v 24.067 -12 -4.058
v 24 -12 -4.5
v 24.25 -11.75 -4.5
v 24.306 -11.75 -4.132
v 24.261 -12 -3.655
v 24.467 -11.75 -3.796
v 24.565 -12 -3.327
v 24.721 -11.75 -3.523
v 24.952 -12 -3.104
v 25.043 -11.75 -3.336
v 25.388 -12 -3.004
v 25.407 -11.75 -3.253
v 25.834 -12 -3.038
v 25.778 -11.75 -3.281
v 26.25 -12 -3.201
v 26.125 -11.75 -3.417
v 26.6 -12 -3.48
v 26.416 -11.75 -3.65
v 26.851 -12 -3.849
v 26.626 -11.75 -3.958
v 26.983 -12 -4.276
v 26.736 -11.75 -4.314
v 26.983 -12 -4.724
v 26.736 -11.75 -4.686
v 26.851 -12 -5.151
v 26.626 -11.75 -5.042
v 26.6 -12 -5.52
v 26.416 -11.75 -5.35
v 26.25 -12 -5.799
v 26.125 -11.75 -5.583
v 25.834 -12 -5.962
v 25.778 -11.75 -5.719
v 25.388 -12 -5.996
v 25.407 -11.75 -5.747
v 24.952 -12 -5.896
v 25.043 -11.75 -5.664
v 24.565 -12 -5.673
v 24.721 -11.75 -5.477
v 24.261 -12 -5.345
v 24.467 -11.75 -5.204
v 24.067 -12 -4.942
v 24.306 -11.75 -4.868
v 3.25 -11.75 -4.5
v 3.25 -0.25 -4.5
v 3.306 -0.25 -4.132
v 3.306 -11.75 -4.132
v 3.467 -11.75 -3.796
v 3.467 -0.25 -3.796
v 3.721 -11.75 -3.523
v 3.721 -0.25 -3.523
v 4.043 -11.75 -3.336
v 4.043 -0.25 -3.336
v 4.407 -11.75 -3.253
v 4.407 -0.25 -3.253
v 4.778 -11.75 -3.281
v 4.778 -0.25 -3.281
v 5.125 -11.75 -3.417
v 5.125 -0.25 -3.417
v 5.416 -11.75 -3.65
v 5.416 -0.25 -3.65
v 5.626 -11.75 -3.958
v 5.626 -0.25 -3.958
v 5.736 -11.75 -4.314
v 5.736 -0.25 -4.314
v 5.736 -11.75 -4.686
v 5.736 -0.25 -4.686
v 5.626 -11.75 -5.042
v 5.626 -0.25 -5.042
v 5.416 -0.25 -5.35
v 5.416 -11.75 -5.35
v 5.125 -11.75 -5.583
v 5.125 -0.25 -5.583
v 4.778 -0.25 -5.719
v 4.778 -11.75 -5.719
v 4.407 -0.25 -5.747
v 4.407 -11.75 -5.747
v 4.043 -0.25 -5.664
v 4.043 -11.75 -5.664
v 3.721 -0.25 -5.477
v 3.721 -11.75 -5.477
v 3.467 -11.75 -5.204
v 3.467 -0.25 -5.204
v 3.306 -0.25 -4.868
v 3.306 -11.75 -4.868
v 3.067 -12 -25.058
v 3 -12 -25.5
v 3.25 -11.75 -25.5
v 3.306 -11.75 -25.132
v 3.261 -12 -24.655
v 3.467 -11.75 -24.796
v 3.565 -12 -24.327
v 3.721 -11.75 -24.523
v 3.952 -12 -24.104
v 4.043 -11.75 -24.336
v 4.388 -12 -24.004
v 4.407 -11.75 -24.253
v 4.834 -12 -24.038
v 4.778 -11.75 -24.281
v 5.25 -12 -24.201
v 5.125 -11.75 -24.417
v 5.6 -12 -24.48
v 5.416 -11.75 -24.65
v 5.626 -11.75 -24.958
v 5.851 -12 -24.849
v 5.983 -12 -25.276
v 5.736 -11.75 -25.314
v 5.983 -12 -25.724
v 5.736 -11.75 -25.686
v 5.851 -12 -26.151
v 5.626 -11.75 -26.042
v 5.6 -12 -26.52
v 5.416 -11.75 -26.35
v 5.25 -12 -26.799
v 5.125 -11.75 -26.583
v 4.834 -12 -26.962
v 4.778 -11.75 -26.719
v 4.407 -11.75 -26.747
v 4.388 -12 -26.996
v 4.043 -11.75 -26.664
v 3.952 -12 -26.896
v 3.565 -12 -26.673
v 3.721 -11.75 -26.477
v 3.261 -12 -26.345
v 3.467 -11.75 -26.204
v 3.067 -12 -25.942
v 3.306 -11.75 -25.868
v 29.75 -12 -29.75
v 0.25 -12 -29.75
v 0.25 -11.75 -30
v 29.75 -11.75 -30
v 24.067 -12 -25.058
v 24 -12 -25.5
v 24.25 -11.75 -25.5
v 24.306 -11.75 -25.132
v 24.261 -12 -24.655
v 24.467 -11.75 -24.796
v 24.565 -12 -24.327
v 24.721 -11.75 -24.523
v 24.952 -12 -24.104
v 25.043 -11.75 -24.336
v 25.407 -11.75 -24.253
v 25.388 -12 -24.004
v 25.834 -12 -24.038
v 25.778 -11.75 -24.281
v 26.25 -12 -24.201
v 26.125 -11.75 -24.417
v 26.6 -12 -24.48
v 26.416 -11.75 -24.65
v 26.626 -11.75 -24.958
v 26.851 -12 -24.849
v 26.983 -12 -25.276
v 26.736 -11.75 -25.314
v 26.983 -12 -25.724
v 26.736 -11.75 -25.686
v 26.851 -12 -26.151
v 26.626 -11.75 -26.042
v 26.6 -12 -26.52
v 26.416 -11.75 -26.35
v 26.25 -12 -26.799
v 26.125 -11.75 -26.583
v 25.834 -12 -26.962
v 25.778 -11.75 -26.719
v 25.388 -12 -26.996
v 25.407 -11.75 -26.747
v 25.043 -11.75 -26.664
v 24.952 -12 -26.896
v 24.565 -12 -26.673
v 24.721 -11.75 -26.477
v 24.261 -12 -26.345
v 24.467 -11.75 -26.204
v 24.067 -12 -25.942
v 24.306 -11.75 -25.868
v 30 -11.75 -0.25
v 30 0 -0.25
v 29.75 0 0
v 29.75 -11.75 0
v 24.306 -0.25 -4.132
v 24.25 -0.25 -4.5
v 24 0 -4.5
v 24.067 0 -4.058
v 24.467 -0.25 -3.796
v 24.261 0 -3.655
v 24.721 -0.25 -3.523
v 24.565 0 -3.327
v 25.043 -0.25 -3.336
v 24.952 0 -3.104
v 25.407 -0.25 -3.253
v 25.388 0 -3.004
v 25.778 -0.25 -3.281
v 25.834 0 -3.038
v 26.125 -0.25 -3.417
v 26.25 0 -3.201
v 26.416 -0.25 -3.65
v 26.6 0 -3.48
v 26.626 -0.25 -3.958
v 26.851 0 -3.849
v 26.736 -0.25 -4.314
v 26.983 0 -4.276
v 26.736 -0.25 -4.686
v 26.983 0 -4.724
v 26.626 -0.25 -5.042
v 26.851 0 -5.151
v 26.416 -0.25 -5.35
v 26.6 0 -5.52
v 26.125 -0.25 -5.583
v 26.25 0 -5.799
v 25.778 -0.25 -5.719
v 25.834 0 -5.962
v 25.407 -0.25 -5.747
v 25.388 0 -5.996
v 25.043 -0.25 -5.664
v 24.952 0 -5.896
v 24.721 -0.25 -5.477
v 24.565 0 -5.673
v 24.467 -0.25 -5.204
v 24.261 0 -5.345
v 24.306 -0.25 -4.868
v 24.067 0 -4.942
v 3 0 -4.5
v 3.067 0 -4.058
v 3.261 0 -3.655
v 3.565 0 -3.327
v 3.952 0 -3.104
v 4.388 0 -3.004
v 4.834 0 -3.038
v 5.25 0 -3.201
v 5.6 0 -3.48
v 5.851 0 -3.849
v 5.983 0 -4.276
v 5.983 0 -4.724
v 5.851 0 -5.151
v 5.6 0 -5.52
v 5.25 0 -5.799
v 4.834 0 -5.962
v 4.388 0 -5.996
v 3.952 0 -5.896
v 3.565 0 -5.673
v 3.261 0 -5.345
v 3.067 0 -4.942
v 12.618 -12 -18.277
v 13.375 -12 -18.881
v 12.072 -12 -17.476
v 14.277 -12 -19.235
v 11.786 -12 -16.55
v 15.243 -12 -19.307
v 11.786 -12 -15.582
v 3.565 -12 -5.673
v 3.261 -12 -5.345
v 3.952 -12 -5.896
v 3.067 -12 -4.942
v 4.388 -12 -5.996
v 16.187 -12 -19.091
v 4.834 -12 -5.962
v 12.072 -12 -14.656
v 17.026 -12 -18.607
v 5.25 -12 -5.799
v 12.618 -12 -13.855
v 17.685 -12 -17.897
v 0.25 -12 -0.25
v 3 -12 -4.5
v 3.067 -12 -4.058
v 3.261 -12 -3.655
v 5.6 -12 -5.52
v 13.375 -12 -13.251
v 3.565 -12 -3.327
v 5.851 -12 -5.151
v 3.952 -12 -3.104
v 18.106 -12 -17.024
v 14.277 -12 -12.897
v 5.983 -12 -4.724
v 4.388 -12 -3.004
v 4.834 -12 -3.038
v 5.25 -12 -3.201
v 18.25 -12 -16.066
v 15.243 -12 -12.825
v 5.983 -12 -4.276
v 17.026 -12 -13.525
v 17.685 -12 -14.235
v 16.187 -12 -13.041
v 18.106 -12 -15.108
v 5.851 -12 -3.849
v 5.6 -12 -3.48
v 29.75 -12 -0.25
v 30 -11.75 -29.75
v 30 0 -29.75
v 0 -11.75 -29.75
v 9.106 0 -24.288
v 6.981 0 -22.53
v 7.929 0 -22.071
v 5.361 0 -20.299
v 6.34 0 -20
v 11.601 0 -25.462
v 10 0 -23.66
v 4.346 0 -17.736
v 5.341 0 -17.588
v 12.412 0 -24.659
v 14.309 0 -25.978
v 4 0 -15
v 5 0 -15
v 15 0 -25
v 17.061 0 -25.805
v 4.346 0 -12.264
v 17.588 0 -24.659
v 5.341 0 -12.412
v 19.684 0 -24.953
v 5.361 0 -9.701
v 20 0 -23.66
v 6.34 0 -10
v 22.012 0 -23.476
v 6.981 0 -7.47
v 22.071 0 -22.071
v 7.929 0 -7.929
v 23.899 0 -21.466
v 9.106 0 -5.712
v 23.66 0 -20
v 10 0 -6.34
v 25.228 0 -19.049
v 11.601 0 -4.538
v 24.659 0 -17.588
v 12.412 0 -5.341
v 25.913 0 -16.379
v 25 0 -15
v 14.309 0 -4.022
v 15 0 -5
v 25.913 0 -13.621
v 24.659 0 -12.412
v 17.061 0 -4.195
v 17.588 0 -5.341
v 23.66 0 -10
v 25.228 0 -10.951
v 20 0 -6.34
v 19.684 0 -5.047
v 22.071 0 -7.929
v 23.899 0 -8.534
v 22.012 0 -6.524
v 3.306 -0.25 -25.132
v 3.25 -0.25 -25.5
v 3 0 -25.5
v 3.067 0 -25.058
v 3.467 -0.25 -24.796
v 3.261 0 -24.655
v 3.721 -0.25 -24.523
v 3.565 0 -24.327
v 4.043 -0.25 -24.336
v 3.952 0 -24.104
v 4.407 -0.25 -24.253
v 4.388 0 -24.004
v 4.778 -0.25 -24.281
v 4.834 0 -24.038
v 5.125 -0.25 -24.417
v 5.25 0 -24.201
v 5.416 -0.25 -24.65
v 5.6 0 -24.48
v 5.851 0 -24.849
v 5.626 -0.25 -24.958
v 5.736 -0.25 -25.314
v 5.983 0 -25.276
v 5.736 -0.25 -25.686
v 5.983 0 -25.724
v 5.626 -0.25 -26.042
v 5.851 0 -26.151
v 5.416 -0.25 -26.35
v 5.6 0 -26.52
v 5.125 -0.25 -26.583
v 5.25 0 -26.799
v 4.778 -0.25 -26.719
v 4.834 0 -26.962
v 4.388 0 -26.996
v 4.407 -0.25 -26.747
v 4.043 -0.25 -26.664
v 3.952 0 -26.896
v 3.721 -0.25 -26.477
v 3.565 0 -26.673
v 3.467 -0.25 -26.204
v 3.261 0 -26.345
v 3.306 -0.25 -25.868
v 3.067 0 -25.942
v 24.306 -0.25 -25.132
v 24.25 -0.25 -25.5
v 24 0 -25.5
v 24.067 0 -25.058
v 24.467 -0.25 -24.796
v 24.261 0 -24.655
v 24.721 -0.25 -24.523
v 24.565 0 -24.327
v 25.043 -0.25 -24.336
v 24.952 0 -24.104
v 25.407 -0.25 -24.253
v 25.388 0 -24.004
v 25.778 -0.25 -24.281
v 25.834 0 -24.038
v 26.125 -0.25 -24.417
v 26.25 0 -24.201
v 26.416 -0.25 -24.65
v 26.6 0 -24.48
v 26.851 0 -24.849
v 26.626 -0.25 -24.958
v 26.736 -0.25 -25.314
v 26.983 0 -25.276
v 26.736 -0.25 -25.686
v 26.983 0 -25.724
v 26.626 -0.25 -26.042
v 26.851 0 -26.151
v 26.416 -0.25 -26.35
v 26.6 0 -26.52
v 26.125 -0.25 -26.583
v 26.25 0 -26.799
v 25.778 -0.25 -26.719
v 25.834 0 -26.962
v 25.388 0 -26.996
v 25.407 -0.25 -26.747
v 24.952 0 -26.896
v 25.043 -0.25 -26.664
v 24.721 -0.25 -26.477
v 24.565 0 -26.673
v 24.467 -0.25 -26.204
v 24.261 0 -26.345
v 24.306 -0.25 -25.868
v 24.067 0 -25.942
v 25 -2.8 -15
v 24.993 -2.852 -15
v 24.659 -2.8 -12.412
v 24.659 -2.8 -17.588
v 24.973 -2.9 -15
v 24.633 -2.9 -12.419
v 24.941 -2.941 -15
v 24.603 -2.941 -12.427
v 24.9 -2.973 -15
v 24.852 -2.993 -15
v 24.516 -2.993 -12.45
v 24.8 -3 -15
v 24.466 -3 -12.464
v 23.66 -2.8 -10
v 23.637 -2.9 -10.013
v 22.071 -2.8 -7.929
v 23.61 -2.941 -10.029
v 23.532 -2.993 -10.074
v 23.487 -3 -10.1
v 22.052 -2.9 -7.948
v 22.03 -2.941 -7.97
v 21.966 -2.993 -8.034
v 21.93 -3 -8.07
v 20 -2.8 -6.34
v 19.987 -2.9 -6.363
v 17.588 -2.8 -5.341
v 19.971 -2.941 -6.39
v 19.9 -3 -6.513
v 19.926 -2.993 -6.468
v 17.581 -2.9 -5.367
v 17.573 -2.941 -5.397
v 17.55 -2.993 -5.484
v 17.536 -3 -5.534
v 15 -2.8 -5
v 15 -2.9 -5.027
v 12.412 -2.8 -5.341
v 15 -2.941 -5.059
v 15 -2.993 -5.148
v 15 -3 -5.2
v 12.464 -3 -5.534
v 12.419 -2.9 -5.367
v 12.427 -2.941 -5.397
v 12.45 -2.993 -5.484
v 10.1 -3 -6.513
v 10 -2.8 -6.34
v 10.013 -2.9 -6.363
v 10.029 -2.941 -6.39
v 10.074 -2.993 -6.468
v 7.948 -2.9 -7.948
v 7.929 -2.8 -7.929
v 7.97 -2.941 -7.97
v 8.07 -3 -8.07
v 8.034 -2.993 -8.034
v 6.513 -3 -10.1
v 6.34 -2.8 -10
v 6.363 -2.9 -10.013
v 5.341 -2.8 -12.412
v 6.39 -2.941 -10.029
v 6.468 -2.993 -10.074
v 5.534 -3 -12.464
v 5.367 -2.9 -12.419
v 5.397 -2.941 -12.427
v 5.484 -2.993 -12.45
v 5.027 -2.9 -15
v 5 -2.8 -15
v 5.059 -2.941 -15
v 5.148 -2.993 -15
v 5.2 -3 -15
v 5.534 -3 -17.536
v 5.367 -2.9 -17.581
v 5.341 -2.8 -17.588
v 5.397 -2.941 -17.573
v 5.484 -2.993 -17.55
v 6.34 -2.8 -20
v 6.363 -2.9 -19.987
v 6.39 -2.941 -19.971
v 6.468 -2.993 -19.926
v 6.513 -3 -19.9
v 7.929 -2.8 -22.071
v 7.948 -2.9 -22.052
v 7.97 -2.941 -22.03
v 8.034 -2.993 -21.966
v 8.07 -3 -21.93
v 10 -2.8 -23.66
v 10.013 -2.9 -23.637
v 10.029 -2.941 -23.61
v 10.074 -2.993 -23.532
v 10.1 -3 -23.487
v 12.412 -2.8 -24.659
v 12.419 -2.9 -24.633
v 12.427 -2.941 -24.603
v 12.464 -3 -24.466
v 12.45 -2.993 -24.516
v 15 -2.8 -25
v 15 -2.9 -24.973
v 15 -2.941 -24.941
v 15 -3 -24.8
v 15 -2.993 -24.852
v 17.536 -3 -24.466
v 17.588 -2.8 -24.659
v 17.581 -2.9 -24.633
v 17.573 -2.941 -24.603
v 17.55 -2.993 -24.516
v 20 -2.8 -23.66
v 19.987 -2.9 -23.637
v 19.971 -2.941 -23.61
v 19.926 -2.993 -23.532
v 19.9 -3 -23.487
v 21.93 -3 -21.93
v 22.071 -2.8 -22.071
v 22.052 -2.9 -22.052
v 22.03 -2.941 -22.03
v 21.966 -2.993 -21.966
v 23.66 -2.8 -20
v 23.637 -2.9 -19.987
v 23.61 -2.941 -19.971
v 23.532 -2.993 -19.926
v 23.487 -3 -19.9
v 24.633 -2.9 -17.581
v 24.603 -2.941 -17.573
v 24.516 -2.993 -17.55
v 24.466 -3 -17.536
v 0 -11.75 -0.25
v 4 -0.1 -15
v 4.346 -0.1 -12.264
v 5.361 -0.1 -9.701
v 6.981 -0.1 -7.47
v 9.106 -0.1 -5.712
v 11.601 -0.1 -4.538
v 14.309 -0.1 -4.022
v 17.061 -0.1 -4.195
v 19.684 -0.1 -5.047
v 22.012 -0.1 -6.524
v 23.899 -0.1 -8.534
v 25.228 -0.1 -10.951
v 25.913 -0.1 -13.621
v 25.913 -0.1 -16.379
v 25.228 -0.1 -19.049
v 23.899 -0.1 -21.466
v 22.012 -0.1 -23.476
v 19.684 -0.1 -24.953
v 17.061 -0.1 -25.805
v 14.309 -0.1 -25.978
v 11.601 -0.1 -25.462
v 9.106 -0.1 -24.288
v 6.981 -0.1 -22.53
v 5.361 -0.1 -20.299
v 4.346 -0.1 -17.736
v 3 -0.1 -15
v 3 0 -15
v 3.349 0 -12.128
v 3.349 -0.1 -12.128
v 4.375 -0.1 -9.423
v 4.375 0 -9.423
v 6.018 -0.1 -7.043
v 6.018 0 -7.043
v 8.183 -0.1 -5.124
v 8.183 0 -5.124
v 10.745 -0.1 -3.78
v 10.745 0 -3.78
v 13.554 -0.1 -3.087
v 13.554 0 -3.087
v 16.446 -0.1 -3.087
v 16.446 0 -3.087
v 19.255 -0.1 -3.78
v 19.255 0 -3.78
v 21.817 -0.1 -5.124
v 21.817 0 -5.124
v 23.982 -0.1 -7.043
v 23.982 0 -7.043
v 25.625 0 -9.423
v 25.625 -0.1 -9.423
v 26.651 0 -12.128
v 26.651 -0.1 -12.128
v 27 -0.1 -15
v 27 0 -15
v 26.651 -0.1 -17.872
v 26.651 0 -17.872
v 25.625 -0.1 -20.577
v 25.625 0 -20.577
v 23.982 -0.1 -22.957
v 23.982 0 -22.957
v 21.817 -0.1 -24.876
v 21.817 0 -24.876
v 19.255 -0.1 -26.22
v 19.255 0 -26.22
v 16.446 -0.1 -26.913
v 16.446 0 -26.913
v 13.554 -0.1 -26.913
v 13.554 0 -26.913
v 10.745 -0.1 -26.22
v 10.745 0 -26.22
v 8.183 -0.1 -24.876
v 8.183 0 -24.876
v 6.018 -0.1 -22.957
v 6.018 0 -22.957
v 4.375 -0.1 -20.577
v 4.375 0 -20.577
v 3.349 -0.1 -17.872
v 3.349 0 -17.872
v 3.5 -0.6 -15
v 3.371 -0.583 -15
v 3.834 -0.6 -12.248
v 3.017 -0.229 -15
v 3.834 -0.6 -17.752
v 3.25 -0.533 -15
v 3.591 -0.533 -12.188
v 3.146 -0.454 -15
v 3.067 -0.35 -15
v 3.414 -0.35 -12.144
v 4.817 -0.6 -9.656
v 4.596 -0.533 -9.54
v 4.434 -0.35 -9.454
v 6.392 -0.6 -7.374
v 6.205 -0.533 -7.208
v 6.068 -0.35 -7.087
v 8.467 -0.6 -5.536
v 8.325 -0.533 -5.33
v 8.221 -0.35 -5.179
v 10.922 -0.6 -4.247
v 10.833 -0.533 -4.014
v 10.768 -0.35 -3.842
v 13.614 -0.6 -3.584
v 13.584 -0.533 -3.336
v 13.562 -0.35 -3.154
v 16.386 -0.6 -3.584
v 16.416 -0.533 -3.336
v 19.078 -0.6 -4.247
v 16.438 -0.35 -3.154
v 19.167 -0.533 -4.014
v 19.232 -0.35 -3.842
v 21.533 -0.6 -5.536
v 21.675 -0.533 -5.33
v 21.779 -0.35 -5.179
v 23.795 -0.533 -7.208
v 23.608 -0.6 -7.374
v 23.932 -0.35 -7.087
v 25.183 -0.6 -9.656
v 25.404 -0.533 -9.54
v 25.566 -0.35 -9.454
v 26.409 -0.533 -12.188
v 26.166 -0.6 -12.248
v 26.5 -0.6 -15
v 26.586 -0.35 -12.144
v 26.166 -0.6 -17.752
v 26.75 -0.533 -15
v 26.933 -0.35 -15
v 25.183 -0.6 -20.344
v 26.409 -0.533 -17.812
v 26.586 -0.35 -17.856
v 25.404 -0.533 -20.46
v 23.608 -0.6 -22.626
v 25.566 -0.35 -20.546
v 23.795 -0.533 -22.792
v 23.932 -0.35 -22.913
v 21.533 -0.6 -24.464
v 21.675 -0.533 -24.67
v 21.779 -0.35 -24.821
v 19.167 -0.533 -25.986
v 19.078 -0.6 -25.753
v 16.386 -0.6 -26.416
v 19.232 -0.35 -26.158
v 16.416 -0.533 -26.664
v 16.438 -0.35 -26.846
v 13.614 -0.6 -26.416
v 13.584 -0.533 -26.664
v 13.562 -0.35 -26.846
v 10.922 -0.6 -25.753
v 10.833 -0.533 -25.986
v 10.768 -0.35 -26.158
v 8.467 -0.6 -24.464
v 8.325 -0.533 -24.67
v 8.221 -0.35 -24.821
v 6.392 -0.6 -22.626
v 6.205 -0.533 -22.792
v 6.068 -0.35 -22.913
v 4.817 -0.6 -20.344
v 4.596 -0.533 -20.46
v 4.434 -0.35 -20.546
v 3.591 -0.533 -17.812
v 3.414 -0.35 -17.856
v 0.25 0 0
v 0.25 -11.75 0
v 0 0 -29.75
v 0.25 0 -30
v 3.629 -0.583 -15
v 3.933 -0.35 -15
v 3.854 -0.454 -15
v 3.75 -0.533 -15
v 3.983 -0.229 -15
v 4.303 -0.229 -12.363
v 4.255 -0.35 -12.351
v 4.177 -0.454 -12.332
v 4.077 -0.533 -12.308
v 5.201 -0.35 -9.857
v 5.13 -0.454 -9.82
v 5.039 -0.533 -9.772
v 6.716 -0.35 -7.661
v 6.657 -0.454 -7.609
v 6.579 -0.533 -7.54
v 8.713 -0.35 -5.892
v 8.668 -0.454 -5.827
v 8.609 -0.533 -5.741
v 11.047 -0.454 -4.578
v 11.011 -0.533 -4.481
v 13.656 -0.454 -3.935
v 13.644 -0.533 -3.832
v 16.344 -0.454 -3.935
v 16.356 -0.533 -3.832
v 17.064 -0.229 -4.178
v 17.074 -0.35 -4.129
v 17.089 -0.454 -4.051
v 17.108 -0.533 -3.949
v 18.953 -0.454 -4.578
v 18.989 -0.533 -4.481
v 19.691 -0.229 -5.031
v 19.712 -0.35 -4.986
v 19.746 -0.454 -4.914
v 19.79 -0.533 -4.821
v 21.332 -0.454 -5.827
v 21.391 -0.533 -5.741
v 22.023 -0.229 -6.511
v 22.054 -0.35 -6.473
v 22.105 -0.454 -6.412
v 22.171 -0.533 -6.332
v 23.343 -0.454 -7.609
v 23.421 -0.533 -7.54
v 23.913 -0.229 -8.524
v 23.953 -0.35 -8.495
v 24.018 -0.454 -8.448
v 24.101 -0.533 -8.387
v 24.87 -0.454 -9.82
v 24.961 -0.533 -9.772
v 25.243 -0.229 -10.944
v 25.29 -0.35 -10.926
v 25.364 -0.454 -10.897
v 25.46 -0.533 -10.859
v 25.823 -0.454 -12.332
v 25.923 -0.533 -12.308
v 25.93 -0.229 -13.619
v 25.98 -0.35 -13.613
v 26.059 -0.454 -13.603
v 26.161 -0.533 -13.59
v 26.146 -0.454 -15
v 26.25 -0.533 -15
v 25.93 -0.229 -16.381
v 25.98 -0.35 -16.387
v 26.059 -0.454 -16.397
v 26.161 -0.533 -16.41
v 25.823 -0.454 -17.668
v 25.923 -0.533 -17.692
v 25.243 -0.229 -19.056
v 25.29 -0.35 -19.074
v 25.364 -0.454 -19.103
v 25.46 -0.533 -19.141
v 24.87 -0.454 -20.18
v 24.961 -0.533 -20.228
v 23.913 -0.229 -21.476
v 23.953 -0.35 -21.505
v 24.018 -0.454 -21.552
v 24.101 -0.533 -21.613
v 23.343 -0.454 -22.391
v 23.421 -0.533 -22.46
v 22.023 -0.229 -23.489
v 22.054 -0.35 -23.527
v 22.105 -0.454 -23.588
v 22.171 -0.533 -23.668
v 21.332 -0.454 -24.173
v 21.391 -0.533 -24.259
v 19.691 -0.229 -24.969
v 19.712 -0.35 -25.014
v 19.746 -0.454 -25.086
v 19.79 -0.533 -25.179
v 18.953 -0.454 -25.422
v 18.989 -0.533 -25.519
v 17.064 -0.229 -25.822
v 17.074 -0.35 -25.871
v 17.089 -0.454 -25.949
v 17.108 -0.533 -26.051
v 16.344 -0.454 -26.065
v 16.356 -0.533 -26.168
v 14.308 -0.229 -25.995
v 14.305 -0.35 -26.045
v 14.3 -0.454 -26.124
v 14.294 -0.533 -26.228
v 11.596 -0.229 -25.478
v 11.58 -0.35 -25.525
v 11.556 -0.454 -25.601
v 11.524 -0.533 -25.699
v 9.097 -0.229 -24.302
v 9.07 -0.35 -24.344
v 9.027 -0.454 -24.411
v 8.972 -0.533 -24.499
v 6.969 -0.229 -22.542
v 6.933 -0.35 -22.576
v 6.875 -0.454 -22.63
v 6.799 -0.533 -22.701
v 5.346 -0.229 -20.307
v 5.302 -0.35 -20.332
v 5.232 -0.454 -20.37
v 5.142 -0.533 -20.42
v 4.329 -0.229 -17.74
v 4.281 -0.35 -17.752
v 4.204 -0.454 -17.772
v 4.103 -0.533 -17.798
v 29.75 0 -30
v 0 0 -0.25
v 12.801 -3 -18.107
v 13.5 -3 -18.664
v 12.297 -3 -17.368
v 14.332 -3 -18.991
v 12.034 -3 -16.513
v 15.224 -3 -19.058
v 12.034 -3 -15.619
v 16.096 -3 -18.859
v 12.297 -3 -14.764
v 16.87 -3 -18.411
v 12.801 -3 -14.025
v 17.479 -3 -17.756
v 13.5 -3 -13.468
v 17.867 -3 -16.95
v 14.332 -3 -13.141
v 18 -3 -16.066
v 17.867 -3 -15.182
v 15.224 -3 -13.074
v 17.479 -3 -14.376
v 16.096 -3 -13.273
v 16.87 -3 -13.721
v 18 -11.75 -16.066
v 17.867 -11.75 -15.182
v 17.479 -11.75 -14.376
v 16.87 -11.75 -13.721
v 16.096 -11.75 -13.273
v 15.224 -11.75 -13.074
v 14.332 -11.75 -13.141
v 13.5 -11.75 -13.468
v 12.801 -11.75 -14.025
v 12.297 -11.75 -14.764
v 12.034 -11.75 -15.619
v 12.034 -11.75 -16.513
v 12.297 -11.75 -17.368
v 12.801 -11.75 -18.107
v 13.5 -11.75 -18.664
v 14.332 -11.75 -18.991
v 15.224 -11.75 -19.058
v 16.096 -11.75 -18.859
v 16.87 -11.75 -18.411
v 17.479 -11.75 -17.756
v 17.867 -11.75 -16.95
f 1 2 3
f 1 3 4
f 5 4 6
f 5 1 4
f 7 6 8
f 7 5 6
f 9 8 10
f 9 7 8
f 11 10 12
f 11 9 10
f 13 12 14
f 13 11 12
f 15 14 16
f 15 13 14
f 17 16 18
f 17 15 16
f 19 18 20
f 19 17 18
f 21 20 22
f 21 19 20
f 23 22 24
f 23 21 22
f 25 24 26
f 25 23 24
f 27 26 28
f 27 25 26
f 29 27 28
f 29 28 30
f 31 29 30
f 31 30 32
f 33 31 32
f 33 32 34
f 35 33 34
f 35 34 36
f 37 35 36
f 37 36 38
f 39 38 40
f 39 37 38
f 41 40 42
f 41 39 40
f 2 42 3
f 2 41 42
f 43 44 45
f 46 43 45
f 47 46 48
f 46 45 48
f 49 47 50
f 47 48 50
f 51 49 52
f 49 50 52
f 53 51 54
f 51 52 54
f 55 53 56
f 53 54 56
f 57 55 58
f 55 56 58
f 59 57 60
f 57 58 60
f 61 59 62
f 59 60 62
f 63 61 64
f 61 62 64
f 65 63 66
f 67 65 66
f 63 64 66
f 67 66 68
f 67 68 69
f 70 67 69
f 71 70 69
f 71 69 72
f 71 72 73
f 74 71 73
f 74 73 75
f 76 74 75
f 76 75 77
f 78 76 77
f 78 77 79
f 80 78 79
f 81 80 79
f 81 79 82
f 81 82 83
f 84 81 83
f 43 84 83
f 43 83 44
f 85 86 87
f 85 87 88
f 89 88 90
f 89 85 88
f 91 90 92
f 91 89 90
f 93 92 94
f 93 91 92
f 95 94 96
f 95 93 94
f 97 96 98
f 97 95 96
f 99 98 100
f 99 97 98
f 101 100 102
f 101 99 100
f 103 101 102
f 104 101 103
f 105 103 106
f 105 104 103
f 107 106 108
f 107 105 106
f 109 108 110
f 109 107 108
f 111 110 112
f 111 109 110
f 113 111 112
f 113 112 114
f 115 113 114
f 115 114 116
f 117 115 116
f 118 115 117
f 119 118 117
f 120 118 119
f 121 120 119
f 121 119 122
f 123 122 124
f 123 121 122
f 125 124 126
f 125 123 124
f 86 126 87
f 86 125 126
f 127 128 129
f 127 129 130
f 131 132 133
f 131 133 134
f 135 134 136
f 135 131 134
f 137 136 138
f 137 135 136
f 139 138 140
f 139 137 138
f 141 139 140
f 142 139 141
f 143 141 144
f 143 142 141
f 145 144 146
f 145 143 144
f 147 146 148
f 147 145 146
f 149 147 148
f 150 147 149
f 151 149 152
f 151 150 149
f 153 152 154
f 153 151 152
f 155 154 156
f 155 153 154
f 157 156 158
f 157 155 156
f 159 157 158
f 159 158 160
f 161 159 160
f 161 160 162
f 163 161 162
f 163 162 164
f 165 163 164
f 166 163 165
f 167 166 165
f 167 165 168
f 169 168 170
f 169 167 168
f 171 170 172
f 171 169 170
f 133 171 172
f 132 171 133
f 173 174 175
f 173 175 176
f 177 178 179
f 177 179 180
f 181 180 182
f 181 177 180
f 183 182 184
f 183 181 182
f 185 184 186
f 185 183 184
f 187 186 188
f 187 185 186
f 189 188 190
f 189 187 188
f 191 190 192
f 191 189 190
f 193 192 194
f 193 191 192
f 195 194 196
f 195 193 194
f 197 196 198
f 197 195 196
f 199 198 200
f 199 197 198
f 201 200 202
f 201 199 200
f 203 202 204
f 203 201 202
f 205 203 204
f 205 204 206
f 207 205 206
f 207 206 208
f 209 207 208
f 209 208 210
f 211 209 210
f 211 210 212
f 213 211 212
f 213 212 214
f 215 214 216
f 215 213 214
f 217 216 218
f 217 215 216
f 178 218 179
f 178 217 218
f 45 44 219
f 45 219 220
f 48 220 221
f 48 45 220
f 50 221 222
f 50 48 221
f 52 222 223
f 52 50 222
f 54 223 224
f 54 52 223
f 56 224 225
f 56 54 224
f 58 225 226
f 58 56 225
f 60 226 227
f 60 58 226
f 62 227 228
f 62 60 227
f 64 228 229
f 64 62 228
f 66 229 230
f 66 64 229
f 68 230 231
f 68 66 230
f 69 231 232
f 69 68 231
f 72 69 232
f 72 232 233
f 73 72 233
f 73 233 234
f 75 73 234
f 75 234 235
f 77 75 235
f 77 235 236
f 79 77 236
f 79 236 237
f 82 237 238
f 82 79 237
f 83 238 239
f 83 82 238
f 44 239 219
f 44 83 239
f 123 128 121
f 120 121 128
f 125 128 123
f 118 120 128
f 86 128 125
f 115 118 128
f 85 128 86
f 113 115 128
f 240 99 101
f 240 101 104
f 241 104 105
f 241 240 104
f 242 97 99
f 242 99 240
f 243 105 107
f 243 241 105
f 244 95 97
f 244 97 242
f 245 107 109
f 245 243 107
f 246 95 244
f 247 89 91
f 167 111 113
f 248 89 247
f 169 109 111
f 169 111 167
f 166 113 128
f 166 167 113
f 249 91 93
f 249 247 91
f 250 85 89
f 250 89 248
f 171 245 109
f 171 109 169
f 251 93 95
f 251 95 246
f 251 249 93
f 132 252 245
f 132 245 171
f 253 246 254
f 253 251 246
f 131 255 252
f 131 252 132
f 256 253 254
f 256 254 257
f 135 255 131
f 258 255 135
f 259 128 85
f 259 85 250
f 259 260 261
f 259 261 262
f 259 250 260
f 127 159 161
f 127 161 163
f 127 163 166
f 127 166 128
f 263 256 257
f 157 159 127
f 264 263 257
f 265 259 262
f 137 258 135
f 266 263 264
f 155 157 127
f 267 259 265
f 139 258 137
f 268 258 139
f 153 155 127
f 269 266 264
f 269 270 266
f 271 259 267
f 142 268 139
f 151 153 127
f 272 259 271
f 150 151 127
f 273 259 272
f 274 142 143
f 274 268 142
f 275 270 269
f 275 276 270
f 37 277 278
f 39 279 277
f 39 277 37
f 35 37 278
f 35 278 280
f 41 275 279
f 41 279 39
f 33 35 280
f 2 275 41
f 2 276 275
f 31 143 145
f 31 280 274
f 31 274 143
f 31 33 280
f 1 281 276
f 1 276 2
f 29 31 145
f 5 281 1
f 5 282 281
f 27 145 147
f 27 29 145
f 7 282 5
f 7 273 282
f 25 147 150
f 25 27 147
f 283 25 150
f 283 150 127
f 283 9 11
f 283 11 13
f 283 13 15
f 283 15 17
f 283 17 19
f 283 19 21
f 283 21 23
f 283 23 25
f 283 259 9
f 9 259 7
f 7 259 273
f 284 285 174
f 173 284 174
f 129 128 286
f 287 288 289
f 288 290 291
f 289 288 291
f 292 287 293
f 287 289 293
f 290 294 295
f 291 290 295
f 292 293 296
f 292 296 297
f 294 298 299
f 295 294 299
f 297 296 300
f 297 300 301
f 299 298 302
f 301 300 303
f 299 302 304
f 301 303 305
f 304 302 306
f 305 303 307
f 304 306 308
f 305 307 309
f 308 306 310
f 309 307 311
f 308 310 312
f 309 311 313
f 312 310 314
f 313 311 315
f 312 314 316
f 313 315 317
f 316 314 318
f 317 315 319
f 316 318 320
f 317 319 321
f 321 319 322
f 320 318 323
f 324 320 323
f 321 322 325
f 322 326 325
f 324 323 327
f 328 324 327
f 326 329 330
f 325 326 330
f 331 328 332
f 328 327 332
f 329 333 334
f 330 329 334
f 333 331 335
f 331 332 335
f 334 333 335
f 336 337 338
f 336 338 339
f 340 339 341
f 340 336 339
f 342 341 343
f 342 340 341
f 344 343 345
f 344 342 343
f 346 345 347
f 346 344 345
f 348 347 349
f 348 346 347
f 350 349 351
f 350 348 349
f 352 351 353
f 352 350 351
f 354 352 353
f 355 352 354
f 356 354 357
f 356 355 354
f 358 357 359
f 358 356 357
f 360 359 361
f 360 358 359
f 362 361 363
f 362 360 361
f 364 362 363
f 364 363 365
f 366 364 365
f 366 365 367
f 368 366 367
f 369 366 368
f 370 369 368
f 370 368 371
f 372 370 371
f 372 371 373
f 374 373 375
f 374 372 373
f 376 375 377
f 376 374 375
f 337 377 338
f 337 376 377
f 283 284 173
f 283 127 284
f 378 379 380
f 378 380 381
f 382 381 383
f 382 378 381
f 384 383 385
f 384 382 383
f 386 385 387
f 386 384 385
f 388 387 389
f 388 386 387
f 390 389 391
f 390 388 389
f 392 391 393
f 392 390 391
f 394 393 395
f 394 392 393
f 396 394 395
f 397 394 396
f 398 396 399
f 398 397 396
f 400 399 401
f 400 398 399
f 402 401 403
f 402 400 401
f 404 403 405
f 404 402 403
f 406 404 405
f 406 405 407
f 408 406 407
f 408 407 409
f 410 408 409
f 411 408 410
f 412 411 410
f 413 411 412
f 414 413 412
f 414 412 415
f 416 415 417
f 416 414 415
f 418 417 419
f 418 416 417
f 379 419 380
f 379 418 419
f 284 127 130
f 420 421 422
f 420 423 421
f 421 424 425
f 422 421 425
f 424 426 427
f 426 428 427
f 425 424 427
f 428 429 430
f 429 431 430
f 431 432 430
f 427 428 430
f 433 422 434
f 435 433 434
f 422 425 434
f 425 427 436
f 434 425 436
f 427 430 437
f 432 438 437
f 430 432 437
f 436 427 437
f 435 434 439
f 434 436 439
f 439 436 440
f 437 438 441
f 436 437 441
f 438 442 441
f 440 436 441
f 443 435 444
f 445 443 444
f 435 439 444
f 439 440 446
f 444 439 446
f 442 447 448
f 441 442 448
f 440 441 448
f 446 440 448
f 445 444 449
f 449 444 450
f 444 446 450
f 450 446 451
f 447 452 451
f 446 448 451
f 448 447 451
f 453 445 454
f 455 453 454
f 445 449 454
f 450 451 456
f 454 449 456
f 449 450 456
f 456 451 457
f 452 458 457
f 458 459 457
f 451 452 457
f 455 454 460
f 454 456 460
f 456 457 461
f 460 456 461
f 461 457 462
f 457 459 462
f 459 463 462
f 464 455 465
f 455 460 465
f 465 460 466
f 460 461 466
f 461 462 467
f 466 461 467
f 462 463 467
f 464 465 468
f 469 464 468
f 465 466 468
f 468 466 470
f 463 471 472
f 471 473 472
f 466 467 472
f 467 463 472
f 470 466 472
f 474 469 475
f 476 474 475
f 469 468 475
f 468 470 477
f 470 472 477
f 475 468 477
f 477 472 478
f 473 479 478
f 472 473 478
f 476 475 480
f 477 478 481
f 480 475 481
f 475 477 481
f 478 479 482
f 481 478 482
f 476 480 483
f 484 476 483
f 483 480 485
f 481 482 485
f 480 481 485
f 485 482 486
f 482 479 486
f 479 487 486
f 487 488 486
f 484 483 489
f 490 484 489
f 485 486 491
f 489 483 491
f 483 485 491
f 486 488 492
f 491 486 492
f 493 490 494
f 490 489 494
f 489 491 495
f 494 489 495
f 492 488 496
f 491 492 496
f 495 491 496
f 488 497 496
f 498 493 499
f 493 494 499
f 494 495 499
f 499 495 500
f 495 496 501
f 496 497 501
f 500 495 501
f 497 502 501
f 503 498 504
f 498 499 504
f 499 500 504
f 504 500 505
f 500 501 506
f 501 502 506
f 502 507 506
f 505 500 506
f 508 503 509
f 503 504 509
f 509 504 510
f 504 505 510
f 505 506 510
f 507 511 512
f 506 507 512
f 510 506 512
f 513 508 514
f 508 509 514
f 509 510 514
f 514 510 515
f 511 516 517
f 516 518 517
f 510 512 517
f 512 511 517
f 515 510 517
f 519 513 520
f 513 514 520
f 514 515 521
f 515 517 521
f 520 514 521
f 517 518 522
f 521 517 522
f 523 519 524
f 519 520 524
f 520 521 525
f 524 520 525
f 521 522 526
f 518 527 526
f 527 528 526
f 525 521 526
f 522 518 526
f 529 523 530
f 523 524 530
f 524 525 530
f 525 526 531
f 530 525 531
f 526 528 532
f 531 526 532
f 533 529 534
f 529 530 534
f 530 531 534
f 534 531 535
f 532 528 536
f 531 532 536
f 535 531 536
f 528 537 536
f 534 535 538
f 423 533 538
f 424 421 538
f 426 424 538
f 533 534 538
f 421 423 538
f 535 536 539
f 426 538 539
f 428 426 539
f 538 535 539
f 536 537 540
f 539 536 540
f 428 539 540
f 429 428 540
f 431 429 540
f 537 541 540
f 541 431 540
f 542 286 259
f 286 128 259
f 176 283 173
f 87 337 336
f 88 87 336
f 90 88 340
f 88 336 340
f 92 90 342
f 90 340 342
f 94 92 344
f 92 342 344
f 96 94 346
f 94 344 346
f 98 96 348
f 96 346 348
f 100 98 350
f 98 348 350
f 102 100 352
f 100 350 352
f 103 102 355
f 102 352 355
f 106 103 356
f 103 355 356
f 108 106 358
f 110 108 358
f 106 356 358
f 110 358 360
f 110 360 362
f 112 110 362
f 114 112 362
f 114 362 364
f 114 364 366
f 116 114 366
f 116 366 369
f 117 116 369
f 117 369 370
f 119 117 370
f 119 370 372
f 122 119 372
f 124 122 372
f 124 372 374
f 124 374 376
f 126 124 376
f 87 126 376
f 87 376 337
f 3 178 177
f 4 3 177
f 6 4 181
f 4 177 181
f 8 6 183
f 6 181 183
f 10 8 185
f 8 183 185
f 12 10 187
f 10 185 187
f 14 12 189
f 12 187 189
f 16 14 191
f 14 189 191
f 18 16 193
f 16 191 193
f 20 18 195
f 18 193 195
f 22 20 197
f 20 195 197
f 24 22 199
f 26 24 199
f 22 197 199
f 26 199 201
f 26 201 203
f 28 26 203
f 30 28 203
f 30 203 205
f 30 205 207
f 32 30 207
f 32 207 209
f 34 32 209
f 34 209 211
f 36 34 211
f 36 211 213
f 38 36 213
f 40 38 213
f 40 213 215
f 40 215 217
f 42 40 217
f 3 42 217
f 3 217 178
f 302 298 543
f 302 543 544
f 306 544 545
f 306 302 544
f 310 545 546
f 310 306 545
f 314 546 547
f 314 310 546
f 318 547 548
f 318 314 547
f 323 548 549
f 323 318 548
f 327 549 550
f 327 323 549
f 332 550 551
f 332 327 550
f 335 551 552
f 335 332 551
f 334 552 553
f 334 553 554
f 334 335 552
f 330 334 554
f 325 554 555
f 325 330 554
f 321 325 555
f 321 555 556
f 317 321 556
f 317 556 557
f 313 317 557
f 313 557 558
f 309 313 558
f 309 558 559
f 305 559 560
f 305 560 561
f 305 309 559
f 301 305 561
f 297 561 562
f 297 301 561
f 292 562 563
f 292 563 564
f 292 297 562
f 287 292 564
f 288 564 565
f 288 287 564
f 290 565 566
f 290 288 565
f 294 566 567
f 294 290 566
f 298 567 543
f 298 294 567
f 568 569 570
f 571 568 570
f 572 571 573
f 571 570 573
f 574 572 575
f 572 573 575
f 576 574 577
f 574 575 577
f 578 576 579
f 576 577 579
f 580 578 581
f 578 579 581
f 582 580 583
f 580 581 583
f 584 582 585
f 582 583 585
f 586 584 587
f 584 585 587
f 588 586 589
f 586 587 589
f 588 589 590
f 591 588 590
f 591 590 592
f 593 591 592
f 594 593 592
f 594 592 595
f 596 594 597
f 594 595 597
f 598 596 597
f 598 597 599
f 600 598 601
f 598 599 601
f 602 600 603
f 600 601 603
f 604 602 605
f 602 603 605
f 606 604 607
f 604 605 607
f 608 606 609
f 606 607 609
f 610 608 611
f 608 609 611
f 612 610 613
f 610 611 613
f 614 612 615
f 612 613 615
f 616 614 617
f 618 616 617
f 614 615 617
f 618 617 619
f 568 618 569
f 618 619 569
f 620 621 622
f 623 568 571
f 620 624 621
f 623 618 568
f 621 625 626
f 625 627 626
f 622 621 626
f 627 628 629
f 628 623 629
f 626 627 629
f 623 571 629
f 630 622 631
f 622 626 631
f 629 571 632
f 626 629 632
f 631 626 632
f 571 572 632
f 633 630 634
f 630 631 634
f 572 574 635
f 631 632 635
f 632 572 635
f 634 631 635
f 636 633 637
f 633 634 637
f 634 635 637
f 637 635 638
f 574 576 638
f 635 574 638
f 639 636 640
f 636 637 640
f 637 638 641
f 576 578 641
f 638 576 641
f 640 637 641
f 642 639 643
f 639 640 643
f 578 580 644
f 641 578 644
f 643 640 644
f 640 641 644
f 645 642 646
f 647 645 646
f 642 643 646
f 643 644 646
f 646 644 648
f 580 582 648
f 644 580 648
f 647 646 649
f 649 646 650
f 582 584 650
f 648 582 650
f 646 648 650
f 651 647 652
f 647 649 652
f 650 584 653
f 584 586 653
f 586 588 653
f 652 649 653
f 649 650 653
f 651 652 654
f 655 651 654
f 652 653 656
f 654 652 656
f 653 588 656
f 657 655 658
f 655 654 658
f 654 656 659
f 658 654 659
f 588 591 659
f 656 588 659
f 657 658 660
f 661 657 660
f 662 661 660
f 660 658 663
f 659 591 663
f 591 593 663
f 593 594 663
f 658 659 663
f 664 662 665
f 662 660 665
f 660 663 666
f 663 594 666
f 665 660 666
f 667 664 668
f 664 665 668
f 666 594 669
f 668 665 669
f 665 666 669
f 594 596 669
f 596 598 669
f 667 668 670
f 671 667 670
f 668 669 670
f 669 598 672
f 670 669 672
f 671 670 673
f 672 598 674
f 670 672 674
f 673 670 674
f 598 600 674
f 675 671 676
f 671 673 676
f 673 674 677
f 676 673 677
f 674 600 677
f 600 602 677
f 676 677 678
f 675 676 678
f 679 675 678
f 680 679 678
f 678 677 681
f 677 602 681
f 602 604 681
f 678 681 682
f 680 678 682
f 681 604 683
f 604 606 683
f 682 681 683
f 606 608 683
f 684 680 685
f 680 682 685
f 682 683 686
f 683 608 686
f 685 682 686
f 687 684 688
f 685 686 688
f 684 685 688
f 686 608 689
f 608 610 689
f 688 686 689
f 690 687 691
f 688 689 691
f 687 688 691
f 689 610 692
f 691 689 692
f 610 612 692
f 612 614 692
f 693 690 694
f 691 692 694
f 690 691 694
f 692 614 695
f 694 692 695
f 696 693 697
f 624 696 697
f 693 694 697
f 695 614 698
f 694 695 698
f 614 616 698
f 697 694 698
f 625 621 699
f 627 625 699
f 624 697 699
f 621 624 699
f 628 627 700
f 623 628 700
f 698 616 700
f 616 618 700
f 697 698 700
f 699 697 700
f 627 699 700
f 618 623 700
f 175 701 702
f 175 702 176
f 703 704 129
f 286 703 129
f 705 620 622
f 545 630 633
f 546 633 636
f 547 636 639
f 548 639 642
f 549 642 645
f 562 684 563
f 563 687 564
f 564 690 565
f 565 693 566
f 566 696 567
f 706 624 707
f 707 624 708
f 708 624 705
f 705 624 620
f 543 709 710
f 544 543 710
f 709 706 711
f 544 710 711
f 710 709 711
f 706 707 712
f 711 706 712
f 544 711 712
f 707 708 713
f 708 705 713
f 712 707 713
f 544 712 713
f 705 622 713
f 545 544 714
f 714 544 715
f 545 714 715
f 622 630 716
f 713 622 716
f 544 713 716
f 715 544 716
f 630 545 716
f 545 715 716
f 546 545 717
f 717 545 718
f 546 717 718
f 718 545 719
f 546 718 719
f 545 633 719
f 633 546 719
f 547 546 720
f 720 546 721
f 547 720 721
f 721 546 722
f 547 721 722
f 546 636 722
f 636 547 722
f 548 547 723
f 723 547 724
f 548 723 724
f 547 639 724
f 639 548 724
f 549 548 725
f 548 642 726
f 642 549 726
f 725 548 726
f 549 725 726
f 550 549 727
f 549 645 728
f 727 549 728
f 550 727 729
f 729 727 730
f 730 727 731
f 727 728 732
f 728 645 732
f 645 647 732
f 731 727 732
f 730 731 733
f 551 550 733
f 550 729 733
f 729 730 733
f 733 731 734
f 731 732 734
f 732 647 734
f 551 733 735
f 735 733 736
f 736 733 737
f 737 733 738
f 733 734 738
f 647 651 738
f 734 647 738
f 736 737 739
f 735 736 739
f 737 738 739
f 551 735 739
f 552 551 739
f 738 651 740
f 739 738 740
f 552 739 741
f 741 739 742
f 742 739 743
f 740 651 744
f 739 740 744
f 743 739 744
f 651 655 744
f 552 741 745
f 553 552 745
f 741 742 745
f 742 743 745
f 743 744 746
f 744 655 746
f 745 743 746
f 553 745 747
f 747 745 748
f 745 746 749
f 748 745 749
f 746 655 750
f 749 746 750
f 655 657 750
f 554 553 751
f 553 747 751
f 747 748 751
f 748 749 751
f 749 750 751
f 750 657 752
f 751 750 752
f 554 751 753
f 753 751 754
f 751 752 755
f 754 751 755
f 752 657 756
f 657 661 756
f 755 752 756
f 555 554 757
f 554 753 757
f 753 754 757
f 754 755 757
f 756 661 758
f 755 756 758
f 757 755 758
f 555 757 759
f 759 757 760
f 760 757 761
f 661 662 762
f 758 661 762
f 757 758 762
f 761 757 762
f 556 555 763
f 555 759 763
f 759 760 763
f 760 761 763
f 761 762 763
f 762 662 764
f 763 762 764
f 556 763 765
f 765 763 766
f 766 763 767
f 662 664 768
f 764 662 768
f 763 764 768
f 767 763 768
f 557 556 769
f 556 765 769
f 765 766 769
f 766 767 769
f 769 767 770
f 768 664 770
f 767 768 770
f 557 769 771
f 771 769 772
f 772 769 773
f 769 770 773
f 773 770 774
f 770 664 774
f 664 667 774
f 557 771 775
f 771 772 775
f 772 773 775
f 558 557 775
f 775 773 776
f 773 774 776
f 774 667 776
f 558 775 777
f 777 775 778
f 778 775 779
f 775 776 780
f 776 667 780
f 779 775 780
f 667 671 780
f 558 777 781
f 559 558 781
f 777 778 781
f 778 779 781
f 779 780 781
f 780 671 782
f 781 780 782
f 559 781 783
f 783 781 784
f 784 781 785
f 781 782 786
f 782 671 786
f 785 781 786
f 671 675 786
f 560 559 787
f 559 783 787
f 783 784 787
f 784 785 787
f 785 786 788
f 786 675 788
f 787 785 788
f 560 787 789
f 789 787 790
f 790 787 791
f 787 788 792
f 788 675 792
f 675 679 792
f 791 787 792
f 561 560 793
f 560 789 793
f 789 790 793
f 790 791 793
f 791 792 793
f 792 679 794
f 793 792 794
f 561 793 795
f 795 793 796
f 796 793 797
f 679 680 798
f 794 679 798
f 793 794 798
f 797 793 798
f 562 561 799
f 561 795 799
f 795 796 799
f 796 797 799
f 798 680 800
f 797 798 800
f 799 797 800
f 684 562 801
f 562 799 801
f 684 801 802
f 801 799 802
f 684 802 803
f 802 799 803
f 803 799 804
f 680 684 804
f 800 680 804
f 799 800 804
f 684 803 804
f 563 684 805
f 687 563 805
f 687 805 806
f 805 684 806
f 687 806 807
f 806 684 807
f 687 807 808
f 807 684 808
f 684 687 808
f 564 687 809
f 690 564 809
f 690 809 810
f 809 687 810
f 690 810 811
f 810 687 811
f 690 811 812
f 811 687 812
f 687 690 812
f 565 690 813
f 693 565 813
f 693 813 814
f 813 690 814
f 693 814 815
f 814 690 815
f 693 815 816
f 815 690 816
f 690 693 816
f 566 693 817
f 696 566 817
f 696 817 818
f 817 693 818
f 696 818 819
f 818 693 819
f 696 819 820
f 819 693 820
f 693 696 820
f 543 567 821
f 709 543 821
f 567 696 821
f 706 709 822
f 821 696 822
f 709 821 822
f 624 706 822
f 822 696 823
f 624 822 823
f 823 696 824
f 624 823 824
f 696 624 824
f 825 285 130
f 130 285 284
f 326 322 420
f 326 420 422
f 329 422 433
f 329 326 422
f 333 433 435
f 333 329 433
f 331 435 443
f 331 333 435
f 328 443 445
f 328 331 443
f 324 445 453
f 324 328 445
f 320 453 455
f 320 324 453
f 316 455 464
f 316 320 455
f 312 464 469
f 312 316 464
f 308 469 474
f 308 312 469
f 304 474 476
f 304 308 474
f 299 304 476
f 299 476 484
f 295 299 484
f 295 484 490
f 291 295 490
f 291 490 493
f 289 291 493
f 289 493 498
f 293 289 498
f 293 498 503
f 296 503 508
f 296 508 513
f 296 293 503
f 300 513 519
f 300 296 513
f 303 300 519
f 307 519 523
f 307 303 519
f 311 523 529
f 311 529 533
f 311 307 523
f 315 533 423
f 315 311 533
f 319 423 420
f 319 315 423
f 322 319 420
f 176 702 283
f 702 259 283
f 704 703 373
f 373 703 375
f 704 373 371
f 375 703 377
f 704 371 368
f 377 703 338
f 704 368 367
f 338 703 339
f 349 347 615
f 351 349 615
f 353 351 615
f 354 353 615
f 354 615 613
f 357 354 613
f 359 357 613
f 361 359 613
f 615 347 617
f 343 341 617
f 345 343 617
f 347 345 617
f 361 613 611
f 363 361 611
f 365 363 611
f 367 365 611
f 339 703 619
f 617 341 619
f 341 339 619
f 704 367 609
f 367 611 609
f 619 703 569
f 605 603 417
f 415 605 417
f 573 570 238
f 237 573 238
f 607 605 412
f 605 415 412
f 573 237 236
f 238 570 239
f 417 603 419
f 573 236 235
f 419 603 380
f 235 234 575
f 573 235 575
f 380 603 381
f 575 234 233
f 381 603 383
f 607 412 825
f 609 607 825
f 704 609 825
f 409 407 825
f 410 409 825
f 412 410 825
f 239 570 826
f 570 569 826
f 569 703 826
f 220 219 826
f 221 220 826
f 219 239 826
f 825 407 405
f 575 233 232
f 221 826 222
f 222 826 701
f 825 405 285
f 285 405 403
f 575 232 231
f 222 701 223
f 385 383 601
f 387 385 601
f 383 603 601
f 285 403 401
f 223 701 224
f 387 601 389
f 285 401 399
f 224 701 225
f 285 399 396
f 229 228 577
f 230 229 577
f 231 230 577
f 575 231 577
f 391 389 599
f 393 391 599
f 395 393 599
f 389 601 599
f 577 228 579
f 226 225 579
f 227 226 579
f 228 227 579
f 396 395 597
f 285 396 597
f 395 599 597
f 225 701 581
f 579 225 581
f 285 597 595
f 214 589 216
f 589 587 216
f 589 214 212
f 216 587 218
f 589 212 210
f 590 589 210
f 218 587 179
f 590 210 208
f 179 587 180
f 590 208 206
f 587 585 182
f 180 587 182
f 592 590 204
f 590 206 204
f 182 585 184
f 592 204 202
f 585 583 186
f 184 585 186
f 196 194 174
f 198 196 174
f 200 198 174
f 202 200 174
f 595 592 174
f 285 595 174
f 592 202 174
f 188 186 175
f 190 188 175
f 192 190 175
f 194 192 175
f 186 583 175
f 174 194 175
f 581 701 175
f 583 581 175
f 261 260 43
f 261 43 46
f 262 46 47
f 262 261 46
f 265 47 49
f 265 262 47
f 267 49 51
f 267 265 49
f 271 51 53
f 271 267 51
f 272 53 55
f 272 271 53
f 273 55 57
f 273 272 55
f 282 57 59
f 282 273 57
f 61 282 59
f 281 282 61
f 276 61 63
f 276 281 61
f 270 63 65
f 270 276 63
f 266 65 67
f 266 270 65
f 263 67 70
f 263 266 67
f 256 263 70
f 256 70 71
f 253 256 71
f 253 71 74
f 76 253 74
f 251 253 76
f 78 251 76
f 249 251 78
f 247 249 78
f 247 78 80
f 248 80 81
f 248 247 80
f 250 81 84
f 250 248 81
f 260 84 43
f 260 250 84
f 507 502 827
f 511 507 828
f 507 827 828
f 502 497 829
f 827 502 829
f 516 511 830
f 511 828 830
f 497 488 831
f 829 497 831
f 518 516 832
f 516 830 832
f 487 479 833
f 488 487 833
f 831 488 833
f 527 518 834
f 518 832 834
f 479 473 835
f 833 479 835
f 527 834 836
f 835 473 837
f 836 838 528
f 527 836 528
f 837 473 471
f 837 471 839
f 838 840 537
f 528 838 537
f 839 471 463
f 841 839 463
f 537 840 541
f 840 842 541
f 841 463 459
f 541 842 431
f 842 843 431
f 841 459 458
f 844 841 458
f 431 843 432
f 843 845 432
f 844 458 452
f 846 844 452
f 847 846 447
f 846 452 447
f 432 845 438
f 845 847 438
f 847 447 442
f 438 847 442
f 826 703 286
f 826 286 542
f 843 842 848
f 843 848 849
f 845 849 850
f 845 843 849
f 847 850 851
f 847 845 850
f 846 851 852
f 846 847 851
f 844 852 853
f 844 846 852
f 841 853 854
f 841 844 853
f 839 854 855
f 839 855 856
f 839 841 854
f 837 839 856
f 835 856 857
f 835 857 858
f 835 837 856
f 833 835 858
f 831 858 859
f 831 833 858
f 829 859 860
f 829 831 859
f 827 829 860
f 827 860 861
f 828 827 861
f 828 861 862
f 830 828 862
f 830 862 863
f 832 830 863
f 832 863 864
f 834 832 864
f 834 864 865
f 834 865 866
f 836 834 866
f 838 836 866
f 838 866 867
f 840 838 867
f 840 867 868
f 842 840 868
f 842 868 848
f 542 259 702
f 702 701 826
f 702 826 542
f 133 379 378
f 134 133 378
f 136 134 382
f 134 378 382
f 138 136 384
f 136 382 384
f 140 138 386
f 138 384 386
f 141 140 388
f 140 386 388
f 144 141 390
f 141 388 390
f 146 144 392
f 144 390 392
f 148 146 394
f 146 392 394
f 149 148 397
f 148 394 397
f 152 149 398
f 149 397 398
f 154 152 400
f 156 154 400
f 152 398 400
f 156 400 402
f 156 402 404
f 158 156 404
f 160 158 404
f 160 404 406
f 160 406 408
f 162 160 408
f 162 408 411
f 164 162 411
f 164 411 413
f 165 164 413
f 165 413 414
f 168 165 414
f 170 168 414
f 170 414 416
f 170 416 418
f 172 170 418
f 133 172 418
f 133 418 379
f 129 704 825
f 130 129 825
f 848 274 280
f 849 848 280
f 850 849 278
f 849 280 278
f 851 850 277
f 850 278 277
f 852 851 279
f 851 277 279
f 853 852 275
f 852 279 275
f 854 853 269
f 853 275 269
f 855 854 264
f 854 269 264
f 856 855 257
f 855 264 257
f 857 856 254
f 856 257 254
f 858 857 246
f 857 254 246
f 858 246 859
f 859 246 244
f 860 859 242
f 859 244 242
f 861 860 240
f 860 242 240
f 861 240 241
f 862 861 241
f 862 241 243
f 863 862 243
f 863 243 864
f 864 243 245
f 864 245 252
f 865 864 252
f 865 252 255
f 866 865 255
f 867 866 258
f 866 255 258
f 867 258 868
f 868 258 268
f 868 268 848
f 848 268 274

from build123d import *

# Parameters (mm, degrees)
F0_W     = 30
F0_H     = 30
F0_R     = 10
F0_R_2   = 3
F1_DEPTH = 12
F2_DEPTH = 3
F3_R     = 0.2
F4_R     = 12
F4_R_2   = 11
F5_DEPTH = 0.6
F6_R     = 0.49999
F4_R_3   = 1.25
F7_DEPTH = 25
F8_SIZE  = 0.25


# Not quite as in the source:
# - a fillet or chamfer is up to 0.001 mm smaller than in the source, because OpenCascade refuses the exact size


with BuildPart() as f1:
    # F0 (on Front) → F1 (new body)
    with BuildSketch(Plane.XZ):
        with Locations((15, -15)):
            Rectangle(F0_W, F0_H)
        with Locations((15, -15)):
            Circle(F0_R, mode=Mode.SUBTRACT)
        with Locations((15, -15)):
            Circle(F0_R)
        with Locations((15, -16.066)):
            Circle(F0_R_2, mode=Mode.SUBTRACT)
    extrude(amount=F1_DEPTH)

    # F0 (on Front) → F2 (cut)
    with BuildSketch(Plane.XZ):
        with Locations((15, -15)):
            Circle(F0_R)
        with Locations((15, -16.066)):
            Circle(F0_R_2, mode=Mode.SUBTRACT)
    extrude(amount=F2_DEPTH, mode=Mode.SUBTRACT)

    # F3
    f3_edges = [f1.edges().sort_by_distance(p)[0] for p in [
        (5, -3, -15),
    ]]
    fillet(f3_edges, radius=F3_R)

    # F4 (on face) → F5 (cut)
    with BuildSketch(Plane(origin=(0, 0, 0), x_dir=(-1, 0, 0), z_dir=(0, 1, 0))):
        with Locations((-15, -15)):
            Circle(F4_R)
        with Locations((-15, -15)):
            Circle(F4_R_2, mode=Mode.SUBTRACT)
    extrude(amount=-F5_DEPTH, mode=Mode.SUBTRACT)

    # F6 (radius 0.5 in the source; OpenCascade refuses exactly that, so slightly less here)
    f6_edges = [f1.edges().sort_by_distance(p)[0] for p in [
        (26, -0.6, -15),
        (27, -0.6, -15),
    ]]
    fillet(f6_edges, radius=F6_R)

    # F4 (on face) → F7 (cut)
    with BuildSketch(Plane(origin=(0, 0, 0), x_dir=(-1, 0, 0), z_dir=(0, 1, 0))):
        with Locations((-4.5, -4.5)):
            Circle(F4_R_3)
        with Locations((-25.5, -4.5)):
            Circle(F4_R_3)
        with Locations((-25.5, -25.5)):
            Circle(F4_R_3)
        with Locations((-4.5, -25.5)):
            Circle(F4_R_3)
    extrude(amount=-F7_DEPTH, mode=Mode.SUBTRACT)

    # F8
    f8_edges = [f1.edges().sort_by_distance(p)[0] for p in [
        (15, -12, 0),
        (30, -12, -15),
        (0, -12, -15),
        (15, -12, -30),
        (5.75, -12, -25.5),
        (26.75, -12, -25.5),
        (12, -12, -16.066),
        (5.75, -12, -4.5),
        (26.75, -12, -4.5),
        (30, -6, 0),
        (0, -6, 0),
        (30, -6, -30),
        (0, -6, -30),
        (5.75, 0, -4.5),
        (3.25, -6, -4.5),
        (26.75, 0, -25.5),
        (5.75, 0, -25.5),
        (3.25, -6, -25.5),
        (26.75, 0, -4.5),
    ]]
    chamfer(f8_edges, length=F8_SIZE)


solid = f1.part
